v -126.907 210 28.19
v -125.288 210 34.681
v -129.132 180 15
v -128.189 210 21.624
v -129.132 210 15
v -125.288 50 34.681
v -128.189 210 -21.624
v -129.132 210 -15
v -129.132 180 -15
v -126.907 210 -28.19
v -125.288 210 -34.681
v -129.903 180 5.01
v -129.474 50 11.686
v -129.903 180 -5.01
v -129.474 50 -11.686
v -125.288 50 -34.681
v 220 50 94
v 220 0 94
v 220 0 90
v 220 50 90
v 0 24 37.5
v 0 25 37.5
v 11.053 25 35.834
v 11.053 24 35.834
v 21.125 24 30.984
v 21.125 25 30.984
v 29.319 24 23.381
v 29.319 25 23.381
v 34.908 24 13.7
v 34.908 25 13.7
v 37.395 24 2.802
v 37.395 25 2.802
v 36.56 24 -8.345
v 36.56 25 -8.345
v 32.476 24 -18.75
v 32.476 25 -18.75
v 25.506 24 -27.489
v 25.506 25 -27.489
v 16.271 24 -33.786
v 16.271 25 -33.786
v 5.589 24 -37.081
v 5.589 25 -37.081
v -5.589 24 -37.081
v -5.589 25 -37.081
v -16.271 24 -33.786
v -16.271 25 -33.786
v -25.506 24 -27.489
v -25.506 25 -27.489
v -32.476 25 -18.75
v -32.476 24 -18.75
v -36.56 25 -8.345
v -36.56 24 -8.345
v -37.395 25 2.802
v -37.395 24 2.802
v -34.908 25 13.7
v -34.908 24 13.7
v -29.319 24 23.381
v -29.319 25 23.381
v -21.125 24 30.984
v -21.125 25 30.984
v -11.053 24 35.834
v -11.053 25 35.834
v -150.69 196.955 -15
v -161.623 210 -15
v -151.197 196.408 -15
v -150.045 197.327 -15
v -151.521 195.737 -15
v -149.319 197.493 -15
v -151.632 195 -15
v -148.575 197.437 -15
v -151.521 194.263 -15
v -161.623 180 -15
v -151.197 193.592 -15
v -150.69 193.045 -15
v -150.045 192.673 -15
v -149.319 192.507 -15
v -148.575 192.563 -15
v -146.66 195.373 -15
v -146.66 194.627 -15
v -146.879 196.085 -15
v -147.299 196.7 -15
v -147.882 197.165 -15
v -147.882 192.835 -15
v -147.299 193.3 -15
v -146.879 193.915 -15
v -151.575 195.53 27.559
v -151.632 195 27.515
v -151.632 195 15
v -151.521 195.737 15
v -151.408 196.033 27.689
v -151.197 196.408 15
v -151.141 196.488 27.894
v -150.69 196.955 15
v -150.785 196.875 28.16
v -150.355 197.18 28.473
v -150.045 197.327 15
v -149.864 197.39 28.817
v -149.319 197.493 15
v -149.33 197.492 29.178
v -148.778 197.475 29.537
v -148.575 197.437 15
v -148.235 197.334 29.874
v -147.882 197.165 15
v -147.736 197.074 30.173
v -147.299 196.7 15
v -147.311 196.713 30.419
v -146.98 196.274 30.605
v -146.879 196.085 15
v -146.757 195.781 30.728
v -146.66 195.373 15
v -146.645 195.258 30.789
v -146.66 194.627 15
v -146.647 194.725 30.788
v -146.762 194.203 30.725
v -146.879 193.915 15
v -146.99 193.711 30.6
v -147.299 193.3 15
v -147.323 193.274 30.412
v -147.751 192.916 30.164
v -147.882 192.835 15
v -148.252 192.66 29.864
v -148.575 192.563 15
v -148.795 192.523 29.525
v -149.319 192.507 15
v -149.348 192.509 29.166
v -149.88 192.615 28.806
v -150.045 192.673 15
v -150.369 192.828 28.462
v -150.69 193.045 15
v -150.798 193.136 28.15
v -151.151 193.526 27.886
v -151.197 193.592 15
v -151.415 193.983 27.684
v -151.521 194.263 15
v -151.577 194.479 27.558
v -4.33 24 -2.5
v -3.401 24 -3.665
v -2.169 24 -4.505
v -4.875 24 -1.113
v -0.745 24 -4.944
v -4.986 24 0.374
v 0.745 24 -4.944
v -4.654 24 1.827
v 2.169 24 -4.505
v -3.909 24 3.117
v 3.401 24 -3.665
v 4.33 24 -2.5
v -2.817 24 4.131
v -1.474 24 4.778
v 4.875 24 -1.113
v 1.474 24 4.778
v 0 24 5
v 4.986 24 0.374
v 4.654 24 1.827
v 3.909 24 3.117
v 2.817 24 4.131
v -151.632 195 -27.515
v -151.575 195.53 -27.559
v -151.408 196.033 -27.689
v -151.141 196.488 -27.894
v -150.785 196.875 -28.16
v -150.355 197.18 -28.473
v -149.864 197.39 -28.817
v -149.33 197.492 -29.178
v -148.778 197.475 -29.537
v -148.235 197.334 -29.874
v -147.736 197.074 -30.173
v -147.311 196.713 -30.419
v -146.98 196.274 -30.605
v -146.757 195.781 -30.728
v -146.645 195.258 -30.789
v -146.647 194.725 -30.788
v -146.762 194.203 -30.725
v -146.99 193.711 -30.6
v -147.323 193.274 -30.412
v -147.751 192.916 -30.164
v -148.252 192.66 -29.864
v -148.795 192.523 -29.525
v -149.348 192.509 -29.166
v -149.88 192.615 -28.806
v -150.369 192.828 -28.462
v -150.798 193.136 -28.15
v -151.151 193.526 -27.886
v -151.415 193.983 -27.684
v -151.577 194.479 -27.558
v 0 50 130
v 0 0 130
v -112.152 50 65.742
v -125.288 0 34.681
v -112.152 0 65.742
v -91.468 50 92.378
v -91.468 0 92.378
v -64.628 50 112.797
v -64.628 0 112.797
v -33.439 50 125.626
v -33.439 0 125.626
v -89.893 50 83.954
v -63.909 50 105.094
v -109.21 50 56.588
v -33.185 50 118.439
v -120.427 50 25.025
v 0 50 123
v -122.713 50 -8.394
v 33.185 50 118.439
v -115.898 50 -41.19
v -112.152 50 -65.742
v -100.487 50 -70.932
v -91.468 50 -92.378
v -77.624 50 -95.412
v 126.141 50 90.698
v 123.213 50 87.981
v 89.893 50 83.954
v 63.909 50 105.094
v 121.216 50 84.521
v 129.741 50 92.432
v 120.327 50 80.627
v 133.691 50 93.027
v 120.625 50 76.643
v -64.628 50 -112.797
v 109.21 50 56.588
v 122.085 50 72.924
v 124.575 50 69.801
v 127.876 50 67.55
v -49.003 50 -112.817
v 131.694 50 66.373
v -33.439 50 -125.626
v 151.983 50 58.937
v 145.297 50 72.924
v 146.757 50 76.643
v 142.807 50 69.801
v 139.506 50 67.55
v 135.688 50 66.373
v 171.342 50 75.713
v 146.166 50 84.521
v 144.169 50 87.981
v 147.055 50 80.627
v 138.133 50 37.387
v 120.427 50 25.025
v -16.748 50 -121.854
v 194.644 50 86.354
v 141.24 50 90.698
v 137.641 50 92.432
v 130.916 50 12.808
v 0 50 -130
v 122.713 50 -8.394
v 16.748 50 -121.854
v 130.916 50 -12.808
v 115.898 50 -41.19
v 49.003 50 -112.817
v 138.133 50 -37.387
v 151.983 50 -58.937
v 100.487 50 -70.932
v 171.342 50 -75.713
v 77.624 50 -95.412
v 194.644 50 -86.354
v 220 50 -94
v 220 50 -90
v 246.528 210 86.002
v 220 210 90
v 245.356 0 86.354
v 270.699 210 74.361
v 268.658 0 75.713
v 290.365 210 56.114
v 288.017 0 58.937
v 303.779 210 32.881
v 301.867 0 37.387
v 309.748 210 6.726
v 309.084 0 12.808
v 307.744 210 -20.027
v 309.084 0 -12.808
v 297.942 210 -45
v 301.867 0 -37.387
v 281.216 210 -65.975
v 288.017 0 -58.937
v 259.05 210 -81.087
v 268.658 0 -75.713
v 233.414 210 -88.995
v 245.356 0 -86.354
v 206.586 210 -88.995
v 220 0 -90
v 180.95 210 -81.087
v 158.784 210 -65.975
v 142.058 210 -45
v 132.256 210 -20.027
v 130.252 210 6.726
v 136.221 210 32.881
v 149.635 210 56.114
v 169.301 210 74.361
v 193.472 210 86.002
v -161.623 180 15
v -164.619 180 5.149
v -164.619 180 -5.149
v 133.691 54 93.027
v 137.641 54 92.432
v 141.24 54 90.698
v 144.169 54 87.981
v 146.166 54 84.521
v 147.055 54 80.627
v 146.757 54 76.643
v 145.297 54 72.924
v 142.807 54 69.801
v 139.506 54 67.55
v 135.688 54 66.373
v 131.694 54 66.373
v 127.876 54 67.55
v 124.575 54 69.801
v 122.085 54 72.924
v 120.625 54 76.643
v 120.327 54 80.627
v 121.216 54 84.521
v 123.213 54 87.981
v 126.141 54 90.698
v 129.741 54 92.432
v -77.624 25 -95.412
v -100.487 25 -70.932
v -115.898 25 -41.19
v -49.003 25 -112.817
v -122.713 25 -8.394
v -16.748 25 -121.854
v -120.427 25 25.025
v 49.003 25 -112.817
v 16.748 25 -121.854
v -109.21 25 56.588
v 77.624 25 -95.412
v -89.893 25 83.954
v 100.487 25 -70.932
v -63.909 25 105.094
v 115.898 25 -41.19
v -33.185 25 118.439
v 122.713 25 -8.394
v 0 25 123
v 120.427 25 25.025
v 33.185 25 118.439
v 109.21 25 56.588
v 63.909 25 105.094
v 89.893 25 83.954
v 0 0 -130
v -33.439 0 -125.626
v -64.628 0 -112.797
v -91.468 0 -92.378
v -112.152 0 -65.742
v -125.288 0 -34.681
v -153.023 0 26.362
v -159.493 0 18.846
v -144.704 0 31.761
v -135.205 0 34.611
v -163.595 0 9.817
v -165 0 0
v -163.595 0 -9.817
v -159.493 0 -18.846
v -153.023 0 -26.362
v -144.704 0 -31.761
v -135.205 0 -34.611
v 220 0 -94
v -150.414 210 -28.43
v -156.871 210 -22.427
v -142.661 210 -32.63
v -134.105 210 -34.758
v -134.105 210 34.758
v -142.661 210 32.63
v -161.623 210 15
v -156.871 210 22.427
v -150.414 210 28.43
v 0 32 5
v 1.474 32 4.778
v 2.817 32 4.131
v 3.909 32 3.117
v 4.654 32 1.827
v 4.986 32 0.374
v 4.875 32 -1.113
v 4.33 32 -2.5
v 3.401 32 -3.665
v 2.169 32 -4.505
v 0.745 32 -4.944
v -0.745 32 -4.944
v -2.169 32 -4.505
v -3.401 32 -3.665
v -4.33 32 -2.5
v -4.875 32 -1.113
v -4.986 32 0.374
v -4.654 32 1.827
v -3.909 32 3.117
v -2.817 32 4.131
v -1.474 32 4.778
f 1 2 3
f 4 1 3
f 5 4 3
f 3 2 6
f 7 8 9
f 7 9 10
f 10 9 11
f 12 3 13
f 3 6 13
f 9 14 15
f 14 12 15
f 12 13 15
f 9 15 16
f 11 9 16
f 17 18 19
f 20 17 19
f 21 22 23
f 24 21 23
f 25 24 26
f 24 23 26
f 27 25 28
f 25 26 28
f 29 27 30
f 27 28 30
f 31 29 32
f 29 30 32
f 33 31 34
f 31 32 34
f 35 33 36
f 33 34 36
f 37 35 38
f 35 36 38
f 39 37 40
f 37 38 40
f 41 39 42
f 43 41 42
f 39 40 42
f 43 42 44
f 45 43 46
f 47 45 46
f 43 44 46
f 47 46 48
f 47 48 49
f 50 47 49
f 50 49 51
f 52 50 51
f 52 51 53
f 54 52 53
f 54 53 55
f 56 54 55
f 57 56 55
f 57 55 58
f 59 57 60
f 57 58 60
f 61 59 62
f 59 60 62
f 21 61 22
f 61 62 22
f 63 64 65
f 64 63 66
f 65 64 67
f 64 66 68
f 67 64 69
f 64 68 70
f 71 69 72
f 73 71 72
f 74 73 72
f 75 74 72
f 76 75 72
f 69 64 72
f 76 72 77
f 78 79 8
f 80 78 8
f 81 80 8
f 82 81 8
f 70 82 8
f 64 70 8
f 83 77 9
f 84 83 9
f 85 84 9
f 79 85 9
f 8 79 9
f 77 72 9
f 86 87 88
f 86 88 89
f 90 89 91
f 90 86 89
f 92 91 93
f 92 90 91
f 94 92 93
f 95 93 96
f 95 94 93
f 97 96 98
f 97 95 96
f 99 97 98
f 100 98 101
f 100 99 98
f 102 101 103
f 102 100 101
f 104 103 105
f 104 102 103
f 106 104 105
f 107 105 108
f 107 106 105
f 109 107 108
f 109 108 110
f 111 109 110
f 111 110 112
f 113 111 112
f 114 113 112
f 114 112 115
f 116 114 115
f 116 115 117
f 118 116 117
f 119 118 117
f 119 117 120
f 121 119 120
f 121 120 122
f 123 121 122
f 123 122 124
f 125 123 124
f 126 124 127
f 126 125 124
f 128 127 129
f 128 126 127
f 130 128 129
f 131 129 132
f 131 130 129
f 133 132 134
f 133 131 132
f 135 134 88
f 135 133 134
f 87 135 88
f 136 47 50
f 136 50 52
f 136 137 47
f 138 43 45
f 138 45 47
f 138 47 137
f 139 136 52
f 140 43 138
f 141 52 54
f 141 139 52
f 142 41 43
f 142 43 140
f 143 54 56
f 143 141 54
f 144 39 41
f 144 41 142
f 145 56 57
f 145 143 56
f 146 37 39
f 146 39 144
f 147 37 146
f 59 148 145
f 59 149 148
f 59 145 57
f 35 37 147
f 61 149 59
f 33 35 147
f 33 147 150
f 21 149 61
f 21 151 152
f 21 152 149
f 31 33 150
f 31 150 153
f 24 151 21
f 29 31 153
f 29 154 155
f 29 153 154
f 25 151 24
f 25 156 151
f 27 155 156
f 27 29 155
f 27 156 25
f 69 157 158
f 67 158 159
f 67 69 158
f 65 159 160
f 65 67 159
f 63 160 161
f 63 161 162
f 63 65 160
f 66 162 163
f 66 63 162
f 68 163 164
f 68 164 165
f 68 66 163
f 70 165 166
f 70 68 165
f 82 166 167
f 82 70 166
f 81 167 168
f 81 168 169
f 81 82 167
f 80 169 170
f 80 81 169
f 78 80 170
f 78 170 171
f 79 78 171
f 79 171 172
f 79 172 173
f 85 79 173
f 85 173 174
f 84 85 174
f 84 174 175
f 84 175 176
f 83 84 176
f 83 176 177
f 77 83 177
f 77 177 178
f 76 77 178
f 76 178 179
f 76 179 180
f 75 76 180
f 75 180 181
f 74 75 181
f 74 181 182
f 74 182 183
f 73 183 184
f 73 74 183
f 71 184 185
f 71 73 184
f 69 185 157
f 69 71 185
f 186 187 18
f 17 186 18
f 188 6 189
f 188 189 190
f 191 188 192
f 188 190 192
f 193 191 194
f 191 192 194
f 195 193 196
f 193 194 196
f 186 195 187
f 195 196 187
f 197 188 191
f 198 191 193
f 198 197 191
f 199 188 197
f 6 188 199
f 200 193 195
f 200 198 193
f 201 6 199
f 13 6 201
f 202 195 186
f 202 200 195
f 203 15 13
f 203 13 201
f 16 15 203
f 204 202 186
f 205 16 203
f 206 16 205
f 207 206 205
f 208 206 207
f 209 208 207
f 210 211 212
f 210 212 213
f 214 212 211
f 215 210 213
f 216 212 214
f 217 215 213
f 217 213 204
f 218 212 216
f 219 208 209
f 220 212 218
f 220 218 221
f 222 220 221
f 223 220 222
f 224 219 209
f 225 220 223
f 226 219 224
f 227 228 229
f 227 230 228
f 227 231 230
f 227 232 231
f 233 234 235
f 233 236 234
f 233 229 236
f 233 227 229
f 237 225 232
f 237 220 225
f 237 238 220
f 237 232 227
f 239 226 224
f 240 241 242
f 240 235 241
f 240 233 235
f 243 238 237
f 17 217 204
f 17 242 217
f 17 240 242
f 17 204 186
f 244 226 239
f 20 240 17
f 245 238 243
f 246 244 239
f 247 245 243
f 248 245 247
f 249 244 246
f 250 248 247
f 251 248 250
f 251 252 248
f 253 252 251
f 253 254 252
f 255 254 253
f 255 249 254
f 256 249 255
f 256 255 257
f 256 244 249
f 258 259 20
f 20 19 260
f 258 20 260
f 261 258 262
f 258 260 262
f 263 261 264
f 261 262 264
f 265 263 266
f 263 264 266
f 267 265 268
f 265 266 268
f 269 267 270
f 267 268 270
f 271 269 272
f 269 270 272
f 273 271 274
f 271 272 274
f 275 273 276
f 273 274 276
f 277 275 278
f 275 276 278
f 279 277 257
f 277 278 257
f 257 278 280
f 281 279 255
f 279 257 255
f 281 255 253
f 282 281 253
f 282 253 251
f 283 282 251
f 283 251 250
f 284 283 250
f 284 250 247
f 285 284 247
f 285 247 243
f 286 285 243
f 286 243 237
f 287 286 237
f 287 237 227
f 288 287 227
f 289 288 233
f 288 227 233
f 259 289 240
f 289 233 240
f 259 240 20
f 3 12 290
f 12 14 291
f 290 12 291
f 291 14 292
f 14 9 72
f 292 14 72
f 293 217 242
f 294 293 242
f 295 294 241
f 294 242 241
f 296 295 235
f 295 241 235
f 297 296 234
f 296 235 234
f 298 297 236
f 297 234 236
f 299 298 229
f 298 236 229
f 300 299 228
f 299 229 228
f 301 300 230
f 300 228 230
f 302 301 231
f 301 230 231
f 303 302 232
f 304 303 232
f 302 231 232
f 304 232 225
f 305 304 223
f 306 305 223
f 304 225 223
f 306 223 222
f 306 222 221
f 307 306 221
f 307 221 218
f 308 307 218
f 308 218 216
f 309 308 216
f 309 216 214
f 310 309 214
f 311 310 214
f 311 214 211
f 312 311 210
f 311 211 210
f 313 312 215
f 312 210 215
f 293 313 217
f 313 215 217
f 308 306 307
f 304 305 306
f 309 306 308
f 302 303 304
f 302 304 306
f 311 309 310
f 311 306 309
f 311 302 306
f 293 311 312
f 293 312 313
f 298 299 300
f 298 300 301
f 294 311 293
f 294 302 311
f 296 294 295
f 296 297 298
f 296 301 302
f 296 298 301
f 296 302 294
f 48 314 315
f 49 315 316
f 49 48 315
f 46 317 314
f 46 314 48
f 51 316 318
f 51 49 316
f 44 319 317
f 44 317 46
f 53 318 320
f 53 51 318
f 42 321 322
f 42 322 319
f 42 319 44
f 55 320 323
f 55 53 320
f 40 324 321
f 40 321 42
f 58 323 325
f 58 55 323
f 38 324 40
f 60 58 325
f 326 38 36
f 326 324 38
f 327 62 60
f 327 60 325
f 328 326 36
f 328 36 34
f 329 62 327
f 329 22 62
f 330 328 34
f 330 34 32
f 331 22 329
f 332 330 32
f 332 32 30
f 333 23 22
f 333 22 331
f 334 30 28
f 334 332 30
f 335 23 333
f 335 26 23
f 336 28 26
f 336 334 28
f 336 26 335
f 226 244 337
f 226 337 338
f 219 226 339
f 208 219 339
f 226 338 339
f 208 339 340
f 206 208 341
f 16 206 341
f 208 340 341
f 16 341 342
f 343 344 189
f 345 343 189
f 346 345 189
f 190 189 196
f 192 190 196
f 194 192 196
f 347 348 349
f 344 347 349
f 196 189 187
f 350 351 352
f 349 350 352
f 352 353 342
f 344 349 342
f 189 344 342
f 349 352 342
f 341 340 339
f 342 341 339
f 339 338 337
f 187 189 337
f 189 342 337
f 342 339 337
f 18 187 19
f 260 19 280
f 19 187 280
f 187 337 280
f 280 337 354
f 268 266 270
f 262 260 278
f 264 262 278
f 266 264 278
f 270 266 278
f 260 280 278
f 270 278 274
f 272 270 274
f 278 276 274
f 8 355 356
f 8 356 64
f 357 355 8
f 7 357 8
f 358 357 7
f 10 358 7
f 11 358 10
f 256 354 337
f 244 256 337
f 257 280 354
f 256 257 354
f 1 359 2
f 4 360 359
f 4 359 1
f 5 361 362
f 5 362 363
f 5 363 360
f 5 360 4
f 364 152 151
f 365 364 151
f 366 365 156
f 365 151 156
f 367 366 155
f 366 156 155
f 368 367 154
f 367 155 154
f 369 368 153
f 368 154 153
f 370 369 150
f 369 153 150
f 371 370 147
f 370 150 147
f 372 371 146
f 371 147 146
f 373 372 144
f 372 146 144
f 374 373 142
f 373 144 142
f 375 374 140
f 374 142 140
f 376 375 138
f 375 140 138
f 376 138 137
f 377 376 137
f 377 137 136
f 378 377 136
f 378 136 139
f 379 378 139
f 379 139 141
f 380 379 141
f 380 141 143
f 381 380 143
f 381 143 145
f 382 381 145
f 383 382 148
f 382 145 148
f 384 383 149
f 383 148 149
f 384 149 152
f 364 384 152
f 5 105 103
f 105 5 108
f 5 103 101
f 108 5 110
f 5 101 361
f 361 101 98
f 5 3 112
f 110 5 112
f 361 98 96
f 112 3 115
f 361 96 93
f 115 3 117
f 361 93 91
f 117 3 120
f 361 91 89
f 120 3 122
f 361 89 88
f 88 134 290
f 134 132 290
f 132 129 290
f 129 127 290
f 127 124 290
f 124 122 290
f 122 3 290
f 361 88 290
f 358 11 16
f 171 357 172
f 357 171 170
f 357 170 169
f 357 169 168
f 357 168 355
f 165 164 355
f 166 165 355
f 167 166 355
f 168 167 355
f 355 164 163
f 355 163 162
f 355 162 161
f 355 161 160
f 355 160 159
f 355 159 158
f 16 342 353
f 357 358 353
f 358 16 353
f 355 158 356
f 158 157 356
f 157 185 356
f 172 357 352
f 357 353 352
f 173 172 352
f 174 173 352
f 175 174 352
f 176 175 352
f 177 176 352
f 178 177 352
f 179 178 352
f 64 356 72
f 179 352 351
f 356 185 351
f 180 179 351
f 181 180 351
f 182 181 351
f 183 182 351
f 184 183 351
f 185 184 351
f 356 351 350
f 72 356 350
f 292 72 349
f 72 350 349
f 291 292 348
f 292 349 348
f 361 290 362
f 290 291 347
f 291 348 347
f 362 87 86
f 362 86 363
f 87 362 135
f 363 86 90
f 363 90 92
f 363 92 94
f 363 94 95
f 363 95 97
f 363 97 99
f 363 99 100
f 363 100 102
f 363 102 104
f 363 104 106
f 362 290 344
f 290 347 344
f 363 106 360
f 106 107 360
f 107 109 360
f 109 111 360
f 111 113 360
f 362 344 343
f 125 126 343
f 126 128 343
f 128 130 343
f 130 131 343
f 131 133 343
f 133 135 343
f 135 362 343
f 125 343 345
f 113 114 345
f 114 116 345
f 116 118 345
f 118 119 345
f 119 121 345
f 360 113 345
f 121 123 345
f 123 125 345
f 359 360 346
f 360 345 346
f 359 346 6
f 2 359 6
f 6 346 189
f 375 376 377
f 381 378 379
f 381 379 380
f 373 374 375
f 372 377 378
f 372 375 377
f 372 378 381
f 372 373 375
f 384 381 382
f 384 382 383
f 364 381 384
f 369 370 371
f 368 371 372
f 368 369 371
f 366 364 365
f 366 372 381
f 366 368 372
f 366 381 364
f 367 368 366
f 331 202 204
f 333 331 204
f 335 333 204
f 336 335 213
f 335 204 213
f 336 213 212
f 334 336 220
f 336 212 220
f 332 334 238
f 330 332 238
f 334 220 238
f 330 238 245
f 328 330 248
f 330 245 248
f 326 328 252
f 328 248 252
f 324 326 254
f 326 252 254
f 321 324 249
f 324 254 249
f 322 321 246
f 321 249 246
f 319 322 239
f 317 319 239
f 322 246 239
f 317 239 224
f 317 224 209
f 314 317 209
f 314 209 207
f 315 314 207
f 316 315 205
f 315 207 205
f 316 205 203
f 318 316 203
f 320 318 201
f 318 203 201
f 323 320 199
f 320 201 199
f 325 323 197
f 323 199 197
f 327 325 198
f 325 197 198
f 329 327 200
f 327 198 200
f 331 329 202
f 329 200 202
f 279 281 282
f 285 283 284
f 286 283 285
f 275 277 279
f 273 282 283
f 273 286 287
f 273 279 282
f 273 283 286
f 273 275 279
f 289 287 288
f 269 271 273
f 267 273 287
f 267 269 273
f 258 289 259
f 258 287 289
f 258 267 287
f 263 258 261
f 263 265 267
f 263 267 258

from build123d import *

# Parameters (mm, degrees)
BOSS_EXTRUDE1_DEPTH     = 210
BOSS_EXTRUDE2_DEPTH     = 50
BOSS_EXTRUDE3_DEPTH     = 210
SKETCH4_R               = 123
CUT_EXTRUDE1_DEPTH      = 25
CUT_EXTRUDE2_START      = -30
CUT_EXTRUDE2_DEPTH      = 30
CUT_EXTRUDE3_DEPTH      = 402.528330258
CUT_EXTRUDE3_DEPTH_BACK = 402.528330258
SKETCH8_R               = 2.5
SKETCH9_R               = 37.5
CUT_EXTRUDE4_DEPTH      = 1
SKETCH10_R              = 5
BOSS_EXTRUDE4_DEPTH     = 8
SKETCH11_R              = 13.401847331
BOSS_EXTRUDE5_DEPTH     = 4


with BuildPart() as part:
    # Sketch3 → Boss-Extrude1 (new body)
    with BuildSketch(Plane(origin=(0, 0, 0), x_dir=(1, 0, 0), z_dir=(0, 1, 0))):
        with BuildLine():
            ThreePointArc((220, 90), (130, 0), (220, -90))
            ThreePointArc((220, -90), (283.639610307, -63.639610307), (310, 0))
            ThreePointArc((310, 0), (283.639610307, 63.639610307), (220, 90))
        make_face()
    extrude(amount=BOSS_EXTRUDE1_DEPTH)

    # Sketch3<3> → Boss-Extrude2 (add)
    with BuildSketch(Plane(origin=(0, 0, 0), x_dir=(1, 0, 0), z_dir=(0, 1, 0))):
        with BuildLine():
            ThreePointArc((-125.288461538, -34.681427383), (-78.71281484, -103.461552182), (0, -130))
            Line((0, -130), (220, -94))
            Line((220, -94), (220, -90))
            ThreePointArc((220, -90), (130, 0), (220, 90))
            Line((220, 90), (220, 94))
            Line((220, 94), (0, 130))
            ThreePointArc((0, 130), (-78.71281484, 103.461552182), (-125.288461538, 34.681427383))
            ThreePointArc((-125.288461538, 34.681427383), (-130, 0), (-125.288461538, -34.681427383))
        make_face()
    extrude(amount=BOSS_EXTRUDE2_DEPTH)

    # Sketch3<4> → Boss-Extrude3 (add)
    with BuildSketch(Plane(origin=(0, 0, 0), x_dir=(1, 0, 0), z_dir=(0, 1, 0))):
        with BuildLine():
            ThreePointArc((-125.288461538, 34.681427383), (-165, 0), (-125.288461538, -34.681427383))
            ThreePointArc((-125.288461538, -34.681427383), (-130, 0), (-125.288461538, 34.681427383))
        make_face()
    extrude(amount=BOSS_EXTRUDE3_DEPTH)

    # Sketch4 → Cut-Extrude1 (cut)
    with BuildSketch(Plane(origin=(0, 50, 0), x_dir=(1, 0, 0), z_dir=(0, 1, 0))):
        Circle(SKETCH4_R)
    extrude(amount=-CUT_EXTRUDE1_DEPTH, mode=Mode.SUBTRACT)

    # Sketch6 → Cut-Extrude2 (cut)
    with BuildSketch(Plane(origin=(0, 210, 0), x_dir=(1, 0, 0), z_dir=(0, 1, 0)).offset(CUT_EXTRUDE2_START)):
        with BuildLine():
            Line((-161.622776602, 15), (-129.131715701, 15))
            ThreePointArc((-129.131715701, 15), (-130, 0), (-129.131715701, -15))
            Line((-129.131715701, -15), (-161.622776602, -15))
            ThreePointArc((-161.622776602, -15), (-165, 0), (-161.622776602, 15))
        make_face()
    extrude(amount=CUT_EXTRUDE2_DEPTH, mode=Mode.SUBTRACT)

    # Sketch8 → Cut-Extrude3 (cut, two sides: drawn at the far end of the back side and taken through both)
    with BuildSketch(Plane(origin=(0, 0, 15), x_dir=(-1, 0, 0), z_dir=(0, 0, -1)).offset(-CUT_EXTRUDE3_DEPTH_BACK)):
        with Locations((149.131715701, 195)):
            Circle(SKETCH8_R)
    extrude(amount=CUT_EXTRUDE3_DEPTH + CUT_EXTRUDE3_DEPTH_BACK, mode=Mode.SUBTRACT)

    # Sketch9 → Cut-Extrude4 (cut)
    with BuildSketch(Plane(origin=(0, 25, 0), x_dir=(1, 0, 0), z_dir=(0, 1, 0))):
        Circle(SKETCH9_R)
    extrude(amount=-CUT_EXTRUDE4_DEPTH, mode=Mode.SUBTRACT)

    # Sketch10 → Boss-Extrude4 (add)
    with BuildSketch(Plane(origin=(0, 24, 0), x_dir=(1, 0, 0), z_dir=(0, 1, 0))):
        Circle(SKETCH10_R)
    extrude(amount=BOSS_EXTRUDE4_DEPTH)

    # Sketch11 → Boss-Extrude5 (add)
    with BuildSketch(Plane(origin=(0, 50, 0), x_dir=(1, 0, 0), z_dir=(0, 1, 0))):
        with Locations((133.690962694, -79.625060242)):
            Circle(SKETCH11_R)
    extrude(amount=BOSS_EXTRUDE5_DEPTH)


solid = part.part
